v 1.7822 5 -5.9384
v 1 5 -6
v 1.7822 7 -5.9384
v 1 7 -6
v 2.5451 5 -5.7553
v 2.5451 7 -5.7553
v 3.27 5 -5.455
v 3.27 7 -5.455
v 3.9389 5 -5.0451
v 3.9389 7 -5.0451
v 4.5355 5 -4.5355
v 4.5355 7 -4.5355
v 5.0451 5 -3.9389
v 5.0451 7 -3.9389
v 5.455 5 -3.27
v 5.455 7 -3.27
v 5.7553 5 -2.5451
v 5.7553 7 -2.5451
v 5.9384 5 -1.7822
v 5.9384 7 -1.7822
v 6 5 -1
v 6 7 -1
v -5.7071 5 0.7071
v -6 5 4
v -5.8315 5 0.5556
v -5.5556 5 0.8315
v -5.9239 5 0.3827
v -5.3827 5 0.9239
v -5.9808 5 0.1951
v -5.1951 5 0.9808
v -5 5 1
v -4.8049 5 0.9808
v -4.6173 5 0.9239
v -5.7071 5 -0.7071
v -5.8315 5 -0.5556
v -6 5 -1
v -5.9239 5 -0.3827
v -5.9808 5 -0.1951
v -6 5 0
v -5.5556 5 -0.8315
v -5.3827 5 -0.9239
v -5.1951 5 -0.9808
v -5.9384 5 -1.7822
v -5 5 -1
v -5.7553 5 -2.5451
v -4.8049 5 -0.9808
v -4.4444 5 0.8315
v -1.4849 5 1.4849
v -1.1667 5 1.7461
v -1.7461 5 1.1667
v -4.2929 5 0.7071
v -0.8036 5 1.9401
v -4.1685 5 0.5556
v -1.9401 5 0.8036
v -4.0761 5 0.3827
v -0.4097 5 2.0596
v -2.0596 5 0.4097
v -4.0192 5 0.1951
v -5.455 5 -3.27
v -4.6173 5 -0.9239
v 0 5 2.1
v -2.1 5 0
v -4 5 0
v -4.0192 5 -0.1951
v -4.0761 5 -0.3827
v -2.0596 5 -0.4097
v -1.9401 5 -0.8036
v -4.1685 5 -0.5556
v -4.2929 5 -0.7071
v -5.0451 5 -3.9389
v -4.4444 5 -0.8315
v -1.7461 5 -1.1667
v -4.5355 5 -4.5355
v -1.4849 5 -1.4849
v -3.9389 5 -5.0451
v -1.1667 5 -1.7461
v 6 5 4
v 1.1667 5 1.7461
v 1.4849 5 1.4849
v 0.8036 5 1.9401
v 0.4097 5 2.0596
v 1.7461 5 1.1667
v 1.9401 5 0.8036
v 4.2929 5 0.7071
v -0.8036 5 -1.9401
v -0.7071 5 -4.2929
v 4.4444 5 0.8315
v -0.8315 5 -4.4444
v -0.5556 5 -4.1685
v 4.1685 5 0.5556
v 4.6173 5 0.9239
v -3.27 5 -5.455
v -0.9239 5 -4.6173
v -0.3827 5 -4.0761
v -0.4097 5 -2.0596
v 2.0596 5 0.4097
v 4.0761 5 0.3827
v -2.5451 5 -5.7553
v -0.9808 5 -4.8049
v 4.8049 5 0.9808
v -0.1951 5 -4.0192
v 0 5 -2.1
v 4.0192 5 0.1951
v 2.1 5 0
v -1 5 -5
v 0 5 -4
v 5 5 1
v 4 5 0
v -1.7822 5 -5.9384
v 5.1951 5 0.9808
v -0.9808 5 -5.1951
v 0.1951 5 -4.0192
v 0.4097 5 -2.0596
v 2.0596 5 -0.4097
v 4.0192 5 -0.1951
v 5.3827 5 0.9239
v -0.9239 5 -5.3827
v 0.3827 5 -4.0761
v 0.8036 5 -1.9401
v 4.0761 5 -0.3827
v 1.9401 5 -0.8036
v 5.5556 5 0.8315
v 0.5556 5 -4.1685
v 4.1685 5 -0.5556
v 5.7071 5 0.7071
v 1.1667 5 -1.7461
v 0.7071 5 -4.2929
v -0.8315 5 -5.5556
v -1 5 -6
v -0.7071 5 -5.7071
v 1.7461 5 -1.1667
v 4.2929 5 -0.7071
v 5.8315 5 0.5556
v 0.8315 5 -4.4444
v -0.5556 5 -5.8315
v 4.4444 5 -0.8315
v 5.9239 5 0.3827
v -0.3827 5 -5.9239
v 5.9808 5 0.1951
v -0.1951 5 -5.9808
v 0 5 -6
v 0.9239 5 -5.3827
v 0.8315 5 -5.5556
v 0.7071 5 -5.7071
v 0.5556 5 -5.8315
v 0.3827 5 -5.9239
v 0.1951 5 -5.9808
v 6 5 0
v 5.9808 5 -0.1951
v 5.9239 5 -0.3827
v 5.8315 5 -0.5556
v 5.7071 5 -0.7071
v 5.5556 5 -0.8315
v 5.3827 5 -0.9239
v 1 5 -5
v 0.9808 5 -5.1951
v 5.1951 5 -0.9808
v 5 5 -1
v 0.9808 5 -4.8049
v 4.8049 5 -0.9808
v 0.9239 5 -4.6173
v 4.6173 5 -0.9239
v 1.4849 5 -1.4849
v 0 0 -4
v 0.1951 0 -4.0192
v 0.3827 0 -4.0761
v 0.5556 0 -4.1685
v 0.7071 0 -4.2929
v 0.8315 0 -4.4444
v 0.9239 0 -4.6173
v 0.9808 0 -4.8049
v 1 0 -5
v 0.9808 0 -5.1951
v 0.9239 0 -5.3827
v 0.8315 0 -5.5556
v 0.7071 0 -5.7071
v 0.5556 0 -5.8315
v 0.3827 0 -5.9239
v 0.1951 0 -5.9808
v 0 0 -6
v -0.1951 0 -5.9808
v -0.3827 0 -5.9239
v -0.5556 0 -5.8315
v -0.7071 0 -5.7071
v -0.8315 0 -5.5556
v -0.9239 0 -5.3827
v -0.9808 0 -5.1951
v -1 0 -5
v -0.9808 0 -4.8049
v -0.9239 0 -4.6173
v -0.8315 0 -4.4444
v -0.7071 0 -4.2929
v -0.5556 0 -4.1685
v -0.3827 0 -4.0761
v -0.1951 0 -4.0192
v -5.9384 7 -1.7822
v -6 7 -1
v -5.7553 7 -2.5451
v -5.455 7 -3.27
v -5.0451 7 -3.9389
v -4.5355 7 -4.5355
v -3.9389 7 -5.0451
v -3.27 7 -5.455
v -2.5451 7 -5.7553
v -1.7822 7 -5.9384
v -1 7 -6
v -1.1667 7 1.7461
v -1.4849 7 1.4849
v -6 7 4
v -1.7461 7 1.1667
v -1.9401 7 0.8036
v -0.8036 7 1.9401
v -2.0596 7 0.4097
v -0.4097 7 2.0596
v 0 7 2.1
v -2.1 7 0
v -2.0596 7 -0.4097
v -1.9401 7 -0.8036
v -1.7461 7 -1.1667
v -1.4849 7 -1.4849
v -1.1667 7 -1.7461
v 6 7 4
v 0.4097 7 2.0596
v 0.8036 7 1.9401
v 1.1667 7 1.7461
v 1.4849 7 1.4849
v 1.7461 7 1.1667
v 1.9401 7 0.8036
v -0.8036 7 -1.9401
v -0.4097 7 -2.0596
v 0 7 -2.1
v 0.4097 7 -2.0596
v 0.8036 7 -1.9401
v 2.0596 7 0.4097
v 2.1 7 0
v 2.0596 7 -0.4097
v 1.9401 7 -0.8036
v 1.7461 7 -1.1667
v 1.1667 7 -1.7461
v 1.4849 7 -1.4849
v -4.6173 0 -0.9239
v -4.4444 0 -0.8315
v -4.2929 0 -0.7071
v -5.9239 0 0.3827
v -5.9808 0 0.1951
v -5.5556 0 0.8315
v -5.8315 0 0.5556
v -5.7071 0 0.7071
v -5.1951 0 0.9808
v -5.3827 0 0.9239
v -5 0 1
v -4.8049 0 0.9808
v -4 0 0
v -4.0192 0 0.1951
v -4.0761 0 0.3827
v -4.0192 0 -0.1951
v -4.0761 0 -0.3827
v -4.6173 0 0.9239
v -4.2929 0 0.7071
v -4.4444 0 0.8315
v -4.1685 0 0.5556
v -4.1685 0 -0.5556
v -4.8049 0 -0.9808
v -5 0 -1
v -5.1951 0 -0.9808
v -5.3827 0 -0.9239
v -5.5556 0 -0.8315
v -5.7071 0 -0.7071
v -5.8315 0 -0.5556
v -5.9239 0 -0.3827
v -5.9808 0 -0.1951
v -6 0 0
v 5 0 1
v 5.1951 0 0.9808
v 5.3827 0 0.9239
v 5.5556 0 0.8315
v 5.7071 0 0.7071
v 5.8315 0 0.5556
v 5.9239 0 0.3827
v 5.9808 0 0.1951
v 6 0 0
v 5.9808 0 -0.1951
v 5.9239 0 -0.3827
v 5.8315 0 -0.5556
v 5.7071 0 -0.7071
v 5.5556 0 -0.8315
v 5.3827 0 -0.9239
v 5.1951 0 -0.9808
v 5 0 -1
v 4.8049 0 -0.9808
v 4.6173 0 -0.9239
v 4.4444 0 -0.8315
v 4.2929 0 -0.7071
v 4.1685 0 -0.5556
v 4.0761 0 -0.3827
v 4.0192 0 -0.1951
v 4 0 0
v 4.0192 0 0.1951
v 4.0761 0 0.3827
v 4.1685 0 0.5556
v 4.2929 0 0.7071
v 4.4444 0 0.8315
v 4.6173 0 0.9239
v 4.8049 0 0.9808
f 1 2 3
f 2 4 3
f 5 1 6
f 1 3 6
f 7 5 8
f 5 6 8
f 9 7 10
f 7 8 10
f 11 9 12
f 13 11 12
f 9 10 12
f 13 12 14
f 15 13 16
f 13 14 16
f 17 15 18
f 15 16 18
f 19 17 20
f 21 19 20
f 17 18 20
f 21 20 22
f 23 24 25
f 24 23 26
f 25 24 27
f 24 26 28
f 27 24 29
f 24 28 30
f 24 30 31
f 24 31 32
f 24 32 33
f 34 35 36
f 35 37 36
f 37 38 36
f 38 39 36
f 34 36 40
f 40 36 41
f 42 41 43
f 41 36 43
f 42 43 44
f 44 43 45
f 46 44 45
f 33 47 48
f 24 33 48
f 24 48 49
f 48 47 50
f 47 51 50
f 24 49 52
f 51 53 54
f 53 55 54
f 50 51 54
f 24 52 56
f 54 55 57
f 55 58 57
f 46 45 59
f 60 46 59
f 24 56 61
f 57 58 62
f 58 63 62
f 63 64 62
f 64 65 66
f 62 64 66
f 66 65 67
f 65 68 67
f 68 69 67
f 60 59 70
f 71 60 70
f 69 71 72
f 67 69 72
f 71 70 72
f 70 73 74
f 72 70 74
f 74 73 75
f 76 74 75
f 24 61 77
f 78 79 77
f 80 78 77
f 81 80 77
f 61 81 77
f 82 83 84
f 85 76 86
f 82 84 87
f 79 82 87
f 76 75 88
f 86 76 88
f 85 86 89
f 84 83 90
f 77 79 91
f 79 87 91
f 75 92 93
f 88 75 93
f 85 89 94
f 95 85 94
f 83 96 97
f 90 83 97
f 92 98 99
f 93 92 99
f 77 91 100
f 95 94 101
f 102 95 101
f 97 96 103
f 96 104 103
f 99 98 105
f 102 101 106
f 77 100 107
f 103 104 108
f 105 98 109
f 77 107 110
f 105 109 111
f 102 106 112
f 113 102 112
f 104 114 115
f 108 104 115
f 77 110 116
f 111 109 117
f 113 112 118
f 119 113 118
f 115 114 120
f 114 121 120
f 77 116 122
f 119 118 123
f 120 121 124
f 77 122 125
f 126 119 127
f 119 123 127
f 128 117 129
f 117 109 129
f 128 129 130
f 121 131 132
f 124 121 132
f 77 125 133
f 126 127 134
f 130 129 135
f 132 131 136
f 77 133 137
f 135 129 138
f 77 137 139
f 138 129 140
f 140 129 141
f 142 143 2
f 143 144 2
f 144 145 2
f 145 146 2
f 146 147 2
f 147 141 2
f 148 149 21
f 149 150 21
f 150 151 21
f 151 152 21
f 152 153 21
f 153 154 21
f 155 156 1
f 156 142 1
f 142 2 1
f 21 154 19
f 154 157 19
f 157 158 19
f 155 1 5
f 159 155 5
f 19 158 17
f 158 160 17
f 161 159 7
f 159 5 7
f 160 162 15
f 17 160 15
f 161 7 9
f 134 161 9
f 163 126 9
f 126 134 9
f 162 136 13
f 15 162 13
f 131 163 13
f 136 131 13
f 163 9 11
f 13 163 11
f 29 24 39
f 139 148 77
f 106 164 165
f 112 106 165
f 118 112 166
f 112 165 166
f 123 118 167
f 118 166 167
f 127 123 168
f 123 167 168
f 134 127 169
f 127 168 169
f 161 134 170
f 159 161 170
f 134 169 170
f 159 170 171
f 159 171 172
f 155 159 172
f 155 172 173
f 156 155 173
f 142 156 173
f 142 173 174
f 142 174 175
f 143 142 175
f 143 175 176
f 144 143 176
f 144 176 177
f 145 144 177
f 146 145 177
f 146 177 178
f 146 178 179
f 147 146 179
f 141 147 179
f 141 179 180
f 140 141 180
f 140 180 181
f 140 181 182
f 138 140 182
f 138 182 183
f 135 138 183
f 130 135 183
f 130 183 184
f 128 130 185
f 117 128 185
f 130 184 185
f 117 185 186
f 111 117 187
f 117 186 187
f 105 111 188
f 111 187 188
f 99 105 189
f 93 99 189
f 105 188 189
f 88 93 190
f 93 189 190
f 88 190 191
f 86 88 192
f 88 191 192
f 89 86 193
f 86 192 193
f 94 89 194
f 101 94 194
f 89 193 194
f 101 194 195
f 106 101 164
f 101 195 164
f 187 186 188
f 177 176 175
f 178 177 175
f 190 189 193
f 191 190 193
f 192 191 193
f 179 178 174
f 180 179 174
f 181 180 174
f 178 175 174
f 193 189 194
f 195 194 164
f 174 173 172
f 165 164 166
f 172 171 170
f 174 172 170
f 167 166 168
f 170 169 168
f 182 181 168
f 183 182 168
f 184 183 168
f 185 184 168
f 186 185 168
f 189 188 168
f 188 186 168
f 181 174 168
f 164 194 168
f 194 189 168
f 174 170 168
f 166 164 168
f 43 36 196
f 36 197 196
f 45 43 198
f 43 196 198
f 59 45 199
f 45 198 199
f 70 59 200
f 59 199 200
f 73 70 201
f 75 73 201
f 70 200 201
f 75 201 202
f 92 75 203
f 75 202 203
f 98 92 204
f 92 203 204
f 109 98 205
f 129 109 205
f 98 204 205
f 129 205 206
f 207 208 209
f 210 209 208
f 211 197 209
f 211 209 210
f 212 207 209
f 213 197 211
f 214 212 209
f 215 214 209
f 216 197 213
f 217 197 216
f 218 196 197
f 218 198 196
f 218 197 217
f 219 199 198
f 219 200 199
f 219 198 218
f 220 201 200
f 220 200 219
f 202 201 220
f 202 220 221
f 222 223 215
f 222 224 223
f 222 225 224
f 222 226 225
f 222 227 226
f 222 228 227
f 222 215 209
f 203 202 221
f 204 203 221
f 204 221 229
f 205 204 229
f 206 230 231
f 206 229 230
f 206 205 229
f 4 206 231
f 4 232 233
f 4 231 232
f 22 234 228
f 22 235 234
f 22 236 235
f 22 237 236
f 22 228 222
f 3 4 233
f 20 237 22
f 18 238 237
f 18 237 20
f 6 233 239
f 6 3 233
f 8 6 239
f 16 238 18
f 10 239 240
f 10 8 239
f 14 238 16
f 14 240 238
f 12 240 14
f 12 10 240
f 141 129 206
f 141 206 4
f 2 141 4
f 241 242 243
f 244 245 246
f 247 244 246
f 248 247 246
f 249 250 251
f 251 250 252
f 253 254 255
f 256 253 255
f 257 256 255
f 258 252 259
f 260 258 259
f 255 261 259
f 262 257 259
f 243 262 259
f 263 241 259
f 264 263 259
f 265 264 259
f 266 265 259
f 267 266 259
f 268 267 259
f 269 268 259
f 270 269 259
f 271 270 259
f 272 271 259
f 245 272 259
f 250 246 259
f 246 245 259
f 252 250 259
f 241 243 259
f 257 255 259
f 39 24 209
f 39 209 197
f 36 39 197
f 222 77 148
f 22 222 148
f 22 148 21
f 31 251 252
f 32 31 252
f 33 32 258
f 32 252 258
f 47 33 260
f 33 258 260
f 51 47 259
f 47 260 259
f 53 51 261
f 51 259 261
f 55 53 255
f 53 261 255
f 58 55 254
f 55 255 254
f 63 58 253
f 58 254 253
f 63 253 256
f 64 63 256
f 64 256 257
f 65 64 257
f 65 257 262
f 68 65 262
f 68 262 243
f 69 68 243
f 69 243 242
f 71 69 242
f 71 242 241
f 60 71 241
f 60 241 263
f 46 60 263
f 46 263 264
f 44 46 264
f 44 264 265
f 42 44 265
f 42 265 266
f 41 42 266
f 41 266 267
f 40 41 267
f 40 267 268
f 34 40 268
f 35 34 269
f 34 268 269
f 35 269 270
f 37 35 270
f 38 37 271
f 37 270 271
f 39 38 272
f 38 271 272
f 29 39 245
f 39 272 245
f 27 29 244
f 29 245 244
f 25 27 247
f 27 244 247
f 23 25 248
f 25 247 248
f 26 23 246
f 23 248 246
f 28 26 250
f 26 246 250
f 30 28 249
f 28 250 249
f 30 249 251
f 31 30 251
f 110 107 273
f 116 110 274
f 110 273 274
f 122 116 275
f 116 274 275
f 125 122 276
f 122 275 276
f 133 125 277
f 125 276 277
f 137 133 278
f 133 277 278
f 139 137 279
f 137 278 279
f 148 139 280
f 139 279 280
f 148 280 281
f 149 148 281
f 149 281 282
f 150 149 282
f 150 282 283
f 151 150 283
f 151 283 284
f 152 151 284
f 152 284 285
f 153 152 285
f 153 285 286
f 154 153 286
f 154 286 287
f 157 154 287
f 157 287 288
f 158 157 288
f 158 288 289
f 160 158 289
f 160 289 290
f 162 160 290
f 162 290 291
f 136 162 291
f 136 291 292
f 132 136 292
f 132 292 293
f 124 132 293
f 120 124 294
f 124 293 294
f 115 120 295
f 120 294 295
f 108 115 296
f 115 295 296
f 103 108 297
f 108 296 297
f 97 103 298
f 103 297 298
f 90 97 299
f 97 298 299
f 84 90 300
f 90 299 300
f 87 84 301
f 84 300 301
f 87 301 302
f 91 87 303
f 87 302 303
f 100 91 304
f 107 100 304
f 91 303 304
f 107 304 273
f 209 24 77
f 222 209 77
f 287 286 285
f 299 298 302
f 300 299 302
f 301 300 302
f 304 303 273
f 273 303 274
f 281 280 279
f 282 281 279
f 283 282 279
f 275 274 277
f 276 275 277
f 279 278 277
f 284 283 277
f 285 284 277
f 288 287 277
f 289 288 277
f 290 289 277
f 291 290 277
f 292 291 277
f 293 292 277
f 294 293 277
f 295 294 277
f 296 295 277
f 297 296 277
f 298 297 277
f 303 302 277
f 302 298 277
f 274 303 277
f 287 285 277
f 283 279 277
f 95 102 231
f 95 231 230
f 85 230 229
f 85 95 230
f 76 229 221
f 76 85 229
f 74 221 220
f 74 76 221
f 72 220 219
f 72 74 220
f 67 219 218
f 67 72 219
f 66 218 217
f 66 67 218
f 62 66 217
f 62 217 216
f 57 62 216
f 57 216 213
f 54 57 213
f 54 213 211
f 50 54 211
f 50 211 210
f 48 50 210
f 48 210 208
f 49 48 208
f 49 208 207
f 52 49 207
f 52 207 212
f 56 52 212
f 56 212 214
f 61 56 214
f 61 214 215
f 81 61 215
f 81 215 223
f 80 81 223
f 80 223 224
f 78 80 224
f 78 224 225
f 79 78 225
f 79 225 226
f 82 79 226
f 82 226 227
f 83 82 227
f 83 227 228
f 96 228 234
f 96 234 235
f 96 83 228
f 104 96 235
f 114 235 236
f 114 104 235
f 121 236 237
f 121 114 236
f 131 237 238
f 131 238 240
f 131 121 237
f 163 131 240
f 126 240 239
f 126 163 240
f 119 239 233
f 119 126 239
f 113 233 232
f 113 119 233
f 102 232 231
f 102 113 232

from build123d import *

# Parameters (mm, degrees)
SKETCH_1_R          = 1
EXTRUDE_1_DEPTH     = 5
EXTRUDE_1_2_DEPTH   = 5
EXTRUDE_1_3_DEPTH   = 5
SKETCH_2_W          = 12
SKETCH_2_H          = 10
EXTRUDE_6_DEPTH     = 2
SKETCH_1_6_R        = 2.1
CUT_EXTRUDE_2_DEPTH = 7
FILLET_1_R          = 5


with BuildPart() as part:
    # 草图1 → 凸台-拉伸1 (new body)
    with BuildSketch(Plane(origin=(0, 0, 0), x_dir=(1, 0, 0), z_dir=(0, 1, 0))):
        with Locations(Location((-5, 0, 0), (0, 0, 270))):
            Circle(SKETCH_1_R)
    extrude(amount=EXTRUDE_1_DEPTH)



with BuildPart() as body_2:
    # 草图1 → Extrude 1 2 (new body)
    with BuildSketch(Plane(origin=(0, 0, 0), x_dir=(1, 0, 0), z_dir=(0, 1, 0))):
        with Locations(Location((0, 5, 0), (0, 0, 270))):
            Circle(SKETCH_1_R)
    extrude(amount=EXTRUDE_1_2_DEPTH)


with BuildPart() as body_3:
    # 草图1 → Extrude 1 3 (new body)
    with BuildSketch(Plane(origin=(0, 0, 0), x_dir=(1, 0, 0), z_dir=(0, 1, 0))):
        with Locations(Location((5, 0, 0), (0, 0, 270))):
            Circle(SKETCH_1_R)
    extrude(amount=EXTRUDE_1_3_DEPTH)


with BuildPart() as part_1:
    add(part.part)

    add(body_2.part)  # 凸台-拉伸6 merges body 2

    add(body_3.part)  # 凸台-拉伸6 merges body 3
    # 草图2 → 凸台-拉伸6 (add)
    with BuildSketch(Plane(origin=(0, 5, 0), x_dir=(1, 0, 0), z_dir=(0, 1, 0))):
        with Locations((0, 1)):
            Rectangle(SKETCH_2_W, SKETCH_2_H)
    extrude(amount=EXTRUDE_6_DEPTH)

    # 草图1<6> → 切除-拉伸2 (cut)
    with BuildSketch(Plane(origin=(0, 0, 0), x_dir=(1, 0, 0), z_dir=(0, 1, 0))):
        with Locations(Location((0, 0, 0), (0, 0, 90))):
            Circle(SKETCH_1_6_R)
    extrude(amount=CUT_EXTRUDE_2_DEPTH, mode=Mode.SUBTRACT)

    # 圆角1
    fillet_1_edges = [part_1.edges().sort_by_distance(p)[0] for p in [
        (-6, 6, -6),
        (6, 6, -6),
    ]]
    fillet(fillet_1_edges, radius=FILLET_1_R)


solid = part_1.part
